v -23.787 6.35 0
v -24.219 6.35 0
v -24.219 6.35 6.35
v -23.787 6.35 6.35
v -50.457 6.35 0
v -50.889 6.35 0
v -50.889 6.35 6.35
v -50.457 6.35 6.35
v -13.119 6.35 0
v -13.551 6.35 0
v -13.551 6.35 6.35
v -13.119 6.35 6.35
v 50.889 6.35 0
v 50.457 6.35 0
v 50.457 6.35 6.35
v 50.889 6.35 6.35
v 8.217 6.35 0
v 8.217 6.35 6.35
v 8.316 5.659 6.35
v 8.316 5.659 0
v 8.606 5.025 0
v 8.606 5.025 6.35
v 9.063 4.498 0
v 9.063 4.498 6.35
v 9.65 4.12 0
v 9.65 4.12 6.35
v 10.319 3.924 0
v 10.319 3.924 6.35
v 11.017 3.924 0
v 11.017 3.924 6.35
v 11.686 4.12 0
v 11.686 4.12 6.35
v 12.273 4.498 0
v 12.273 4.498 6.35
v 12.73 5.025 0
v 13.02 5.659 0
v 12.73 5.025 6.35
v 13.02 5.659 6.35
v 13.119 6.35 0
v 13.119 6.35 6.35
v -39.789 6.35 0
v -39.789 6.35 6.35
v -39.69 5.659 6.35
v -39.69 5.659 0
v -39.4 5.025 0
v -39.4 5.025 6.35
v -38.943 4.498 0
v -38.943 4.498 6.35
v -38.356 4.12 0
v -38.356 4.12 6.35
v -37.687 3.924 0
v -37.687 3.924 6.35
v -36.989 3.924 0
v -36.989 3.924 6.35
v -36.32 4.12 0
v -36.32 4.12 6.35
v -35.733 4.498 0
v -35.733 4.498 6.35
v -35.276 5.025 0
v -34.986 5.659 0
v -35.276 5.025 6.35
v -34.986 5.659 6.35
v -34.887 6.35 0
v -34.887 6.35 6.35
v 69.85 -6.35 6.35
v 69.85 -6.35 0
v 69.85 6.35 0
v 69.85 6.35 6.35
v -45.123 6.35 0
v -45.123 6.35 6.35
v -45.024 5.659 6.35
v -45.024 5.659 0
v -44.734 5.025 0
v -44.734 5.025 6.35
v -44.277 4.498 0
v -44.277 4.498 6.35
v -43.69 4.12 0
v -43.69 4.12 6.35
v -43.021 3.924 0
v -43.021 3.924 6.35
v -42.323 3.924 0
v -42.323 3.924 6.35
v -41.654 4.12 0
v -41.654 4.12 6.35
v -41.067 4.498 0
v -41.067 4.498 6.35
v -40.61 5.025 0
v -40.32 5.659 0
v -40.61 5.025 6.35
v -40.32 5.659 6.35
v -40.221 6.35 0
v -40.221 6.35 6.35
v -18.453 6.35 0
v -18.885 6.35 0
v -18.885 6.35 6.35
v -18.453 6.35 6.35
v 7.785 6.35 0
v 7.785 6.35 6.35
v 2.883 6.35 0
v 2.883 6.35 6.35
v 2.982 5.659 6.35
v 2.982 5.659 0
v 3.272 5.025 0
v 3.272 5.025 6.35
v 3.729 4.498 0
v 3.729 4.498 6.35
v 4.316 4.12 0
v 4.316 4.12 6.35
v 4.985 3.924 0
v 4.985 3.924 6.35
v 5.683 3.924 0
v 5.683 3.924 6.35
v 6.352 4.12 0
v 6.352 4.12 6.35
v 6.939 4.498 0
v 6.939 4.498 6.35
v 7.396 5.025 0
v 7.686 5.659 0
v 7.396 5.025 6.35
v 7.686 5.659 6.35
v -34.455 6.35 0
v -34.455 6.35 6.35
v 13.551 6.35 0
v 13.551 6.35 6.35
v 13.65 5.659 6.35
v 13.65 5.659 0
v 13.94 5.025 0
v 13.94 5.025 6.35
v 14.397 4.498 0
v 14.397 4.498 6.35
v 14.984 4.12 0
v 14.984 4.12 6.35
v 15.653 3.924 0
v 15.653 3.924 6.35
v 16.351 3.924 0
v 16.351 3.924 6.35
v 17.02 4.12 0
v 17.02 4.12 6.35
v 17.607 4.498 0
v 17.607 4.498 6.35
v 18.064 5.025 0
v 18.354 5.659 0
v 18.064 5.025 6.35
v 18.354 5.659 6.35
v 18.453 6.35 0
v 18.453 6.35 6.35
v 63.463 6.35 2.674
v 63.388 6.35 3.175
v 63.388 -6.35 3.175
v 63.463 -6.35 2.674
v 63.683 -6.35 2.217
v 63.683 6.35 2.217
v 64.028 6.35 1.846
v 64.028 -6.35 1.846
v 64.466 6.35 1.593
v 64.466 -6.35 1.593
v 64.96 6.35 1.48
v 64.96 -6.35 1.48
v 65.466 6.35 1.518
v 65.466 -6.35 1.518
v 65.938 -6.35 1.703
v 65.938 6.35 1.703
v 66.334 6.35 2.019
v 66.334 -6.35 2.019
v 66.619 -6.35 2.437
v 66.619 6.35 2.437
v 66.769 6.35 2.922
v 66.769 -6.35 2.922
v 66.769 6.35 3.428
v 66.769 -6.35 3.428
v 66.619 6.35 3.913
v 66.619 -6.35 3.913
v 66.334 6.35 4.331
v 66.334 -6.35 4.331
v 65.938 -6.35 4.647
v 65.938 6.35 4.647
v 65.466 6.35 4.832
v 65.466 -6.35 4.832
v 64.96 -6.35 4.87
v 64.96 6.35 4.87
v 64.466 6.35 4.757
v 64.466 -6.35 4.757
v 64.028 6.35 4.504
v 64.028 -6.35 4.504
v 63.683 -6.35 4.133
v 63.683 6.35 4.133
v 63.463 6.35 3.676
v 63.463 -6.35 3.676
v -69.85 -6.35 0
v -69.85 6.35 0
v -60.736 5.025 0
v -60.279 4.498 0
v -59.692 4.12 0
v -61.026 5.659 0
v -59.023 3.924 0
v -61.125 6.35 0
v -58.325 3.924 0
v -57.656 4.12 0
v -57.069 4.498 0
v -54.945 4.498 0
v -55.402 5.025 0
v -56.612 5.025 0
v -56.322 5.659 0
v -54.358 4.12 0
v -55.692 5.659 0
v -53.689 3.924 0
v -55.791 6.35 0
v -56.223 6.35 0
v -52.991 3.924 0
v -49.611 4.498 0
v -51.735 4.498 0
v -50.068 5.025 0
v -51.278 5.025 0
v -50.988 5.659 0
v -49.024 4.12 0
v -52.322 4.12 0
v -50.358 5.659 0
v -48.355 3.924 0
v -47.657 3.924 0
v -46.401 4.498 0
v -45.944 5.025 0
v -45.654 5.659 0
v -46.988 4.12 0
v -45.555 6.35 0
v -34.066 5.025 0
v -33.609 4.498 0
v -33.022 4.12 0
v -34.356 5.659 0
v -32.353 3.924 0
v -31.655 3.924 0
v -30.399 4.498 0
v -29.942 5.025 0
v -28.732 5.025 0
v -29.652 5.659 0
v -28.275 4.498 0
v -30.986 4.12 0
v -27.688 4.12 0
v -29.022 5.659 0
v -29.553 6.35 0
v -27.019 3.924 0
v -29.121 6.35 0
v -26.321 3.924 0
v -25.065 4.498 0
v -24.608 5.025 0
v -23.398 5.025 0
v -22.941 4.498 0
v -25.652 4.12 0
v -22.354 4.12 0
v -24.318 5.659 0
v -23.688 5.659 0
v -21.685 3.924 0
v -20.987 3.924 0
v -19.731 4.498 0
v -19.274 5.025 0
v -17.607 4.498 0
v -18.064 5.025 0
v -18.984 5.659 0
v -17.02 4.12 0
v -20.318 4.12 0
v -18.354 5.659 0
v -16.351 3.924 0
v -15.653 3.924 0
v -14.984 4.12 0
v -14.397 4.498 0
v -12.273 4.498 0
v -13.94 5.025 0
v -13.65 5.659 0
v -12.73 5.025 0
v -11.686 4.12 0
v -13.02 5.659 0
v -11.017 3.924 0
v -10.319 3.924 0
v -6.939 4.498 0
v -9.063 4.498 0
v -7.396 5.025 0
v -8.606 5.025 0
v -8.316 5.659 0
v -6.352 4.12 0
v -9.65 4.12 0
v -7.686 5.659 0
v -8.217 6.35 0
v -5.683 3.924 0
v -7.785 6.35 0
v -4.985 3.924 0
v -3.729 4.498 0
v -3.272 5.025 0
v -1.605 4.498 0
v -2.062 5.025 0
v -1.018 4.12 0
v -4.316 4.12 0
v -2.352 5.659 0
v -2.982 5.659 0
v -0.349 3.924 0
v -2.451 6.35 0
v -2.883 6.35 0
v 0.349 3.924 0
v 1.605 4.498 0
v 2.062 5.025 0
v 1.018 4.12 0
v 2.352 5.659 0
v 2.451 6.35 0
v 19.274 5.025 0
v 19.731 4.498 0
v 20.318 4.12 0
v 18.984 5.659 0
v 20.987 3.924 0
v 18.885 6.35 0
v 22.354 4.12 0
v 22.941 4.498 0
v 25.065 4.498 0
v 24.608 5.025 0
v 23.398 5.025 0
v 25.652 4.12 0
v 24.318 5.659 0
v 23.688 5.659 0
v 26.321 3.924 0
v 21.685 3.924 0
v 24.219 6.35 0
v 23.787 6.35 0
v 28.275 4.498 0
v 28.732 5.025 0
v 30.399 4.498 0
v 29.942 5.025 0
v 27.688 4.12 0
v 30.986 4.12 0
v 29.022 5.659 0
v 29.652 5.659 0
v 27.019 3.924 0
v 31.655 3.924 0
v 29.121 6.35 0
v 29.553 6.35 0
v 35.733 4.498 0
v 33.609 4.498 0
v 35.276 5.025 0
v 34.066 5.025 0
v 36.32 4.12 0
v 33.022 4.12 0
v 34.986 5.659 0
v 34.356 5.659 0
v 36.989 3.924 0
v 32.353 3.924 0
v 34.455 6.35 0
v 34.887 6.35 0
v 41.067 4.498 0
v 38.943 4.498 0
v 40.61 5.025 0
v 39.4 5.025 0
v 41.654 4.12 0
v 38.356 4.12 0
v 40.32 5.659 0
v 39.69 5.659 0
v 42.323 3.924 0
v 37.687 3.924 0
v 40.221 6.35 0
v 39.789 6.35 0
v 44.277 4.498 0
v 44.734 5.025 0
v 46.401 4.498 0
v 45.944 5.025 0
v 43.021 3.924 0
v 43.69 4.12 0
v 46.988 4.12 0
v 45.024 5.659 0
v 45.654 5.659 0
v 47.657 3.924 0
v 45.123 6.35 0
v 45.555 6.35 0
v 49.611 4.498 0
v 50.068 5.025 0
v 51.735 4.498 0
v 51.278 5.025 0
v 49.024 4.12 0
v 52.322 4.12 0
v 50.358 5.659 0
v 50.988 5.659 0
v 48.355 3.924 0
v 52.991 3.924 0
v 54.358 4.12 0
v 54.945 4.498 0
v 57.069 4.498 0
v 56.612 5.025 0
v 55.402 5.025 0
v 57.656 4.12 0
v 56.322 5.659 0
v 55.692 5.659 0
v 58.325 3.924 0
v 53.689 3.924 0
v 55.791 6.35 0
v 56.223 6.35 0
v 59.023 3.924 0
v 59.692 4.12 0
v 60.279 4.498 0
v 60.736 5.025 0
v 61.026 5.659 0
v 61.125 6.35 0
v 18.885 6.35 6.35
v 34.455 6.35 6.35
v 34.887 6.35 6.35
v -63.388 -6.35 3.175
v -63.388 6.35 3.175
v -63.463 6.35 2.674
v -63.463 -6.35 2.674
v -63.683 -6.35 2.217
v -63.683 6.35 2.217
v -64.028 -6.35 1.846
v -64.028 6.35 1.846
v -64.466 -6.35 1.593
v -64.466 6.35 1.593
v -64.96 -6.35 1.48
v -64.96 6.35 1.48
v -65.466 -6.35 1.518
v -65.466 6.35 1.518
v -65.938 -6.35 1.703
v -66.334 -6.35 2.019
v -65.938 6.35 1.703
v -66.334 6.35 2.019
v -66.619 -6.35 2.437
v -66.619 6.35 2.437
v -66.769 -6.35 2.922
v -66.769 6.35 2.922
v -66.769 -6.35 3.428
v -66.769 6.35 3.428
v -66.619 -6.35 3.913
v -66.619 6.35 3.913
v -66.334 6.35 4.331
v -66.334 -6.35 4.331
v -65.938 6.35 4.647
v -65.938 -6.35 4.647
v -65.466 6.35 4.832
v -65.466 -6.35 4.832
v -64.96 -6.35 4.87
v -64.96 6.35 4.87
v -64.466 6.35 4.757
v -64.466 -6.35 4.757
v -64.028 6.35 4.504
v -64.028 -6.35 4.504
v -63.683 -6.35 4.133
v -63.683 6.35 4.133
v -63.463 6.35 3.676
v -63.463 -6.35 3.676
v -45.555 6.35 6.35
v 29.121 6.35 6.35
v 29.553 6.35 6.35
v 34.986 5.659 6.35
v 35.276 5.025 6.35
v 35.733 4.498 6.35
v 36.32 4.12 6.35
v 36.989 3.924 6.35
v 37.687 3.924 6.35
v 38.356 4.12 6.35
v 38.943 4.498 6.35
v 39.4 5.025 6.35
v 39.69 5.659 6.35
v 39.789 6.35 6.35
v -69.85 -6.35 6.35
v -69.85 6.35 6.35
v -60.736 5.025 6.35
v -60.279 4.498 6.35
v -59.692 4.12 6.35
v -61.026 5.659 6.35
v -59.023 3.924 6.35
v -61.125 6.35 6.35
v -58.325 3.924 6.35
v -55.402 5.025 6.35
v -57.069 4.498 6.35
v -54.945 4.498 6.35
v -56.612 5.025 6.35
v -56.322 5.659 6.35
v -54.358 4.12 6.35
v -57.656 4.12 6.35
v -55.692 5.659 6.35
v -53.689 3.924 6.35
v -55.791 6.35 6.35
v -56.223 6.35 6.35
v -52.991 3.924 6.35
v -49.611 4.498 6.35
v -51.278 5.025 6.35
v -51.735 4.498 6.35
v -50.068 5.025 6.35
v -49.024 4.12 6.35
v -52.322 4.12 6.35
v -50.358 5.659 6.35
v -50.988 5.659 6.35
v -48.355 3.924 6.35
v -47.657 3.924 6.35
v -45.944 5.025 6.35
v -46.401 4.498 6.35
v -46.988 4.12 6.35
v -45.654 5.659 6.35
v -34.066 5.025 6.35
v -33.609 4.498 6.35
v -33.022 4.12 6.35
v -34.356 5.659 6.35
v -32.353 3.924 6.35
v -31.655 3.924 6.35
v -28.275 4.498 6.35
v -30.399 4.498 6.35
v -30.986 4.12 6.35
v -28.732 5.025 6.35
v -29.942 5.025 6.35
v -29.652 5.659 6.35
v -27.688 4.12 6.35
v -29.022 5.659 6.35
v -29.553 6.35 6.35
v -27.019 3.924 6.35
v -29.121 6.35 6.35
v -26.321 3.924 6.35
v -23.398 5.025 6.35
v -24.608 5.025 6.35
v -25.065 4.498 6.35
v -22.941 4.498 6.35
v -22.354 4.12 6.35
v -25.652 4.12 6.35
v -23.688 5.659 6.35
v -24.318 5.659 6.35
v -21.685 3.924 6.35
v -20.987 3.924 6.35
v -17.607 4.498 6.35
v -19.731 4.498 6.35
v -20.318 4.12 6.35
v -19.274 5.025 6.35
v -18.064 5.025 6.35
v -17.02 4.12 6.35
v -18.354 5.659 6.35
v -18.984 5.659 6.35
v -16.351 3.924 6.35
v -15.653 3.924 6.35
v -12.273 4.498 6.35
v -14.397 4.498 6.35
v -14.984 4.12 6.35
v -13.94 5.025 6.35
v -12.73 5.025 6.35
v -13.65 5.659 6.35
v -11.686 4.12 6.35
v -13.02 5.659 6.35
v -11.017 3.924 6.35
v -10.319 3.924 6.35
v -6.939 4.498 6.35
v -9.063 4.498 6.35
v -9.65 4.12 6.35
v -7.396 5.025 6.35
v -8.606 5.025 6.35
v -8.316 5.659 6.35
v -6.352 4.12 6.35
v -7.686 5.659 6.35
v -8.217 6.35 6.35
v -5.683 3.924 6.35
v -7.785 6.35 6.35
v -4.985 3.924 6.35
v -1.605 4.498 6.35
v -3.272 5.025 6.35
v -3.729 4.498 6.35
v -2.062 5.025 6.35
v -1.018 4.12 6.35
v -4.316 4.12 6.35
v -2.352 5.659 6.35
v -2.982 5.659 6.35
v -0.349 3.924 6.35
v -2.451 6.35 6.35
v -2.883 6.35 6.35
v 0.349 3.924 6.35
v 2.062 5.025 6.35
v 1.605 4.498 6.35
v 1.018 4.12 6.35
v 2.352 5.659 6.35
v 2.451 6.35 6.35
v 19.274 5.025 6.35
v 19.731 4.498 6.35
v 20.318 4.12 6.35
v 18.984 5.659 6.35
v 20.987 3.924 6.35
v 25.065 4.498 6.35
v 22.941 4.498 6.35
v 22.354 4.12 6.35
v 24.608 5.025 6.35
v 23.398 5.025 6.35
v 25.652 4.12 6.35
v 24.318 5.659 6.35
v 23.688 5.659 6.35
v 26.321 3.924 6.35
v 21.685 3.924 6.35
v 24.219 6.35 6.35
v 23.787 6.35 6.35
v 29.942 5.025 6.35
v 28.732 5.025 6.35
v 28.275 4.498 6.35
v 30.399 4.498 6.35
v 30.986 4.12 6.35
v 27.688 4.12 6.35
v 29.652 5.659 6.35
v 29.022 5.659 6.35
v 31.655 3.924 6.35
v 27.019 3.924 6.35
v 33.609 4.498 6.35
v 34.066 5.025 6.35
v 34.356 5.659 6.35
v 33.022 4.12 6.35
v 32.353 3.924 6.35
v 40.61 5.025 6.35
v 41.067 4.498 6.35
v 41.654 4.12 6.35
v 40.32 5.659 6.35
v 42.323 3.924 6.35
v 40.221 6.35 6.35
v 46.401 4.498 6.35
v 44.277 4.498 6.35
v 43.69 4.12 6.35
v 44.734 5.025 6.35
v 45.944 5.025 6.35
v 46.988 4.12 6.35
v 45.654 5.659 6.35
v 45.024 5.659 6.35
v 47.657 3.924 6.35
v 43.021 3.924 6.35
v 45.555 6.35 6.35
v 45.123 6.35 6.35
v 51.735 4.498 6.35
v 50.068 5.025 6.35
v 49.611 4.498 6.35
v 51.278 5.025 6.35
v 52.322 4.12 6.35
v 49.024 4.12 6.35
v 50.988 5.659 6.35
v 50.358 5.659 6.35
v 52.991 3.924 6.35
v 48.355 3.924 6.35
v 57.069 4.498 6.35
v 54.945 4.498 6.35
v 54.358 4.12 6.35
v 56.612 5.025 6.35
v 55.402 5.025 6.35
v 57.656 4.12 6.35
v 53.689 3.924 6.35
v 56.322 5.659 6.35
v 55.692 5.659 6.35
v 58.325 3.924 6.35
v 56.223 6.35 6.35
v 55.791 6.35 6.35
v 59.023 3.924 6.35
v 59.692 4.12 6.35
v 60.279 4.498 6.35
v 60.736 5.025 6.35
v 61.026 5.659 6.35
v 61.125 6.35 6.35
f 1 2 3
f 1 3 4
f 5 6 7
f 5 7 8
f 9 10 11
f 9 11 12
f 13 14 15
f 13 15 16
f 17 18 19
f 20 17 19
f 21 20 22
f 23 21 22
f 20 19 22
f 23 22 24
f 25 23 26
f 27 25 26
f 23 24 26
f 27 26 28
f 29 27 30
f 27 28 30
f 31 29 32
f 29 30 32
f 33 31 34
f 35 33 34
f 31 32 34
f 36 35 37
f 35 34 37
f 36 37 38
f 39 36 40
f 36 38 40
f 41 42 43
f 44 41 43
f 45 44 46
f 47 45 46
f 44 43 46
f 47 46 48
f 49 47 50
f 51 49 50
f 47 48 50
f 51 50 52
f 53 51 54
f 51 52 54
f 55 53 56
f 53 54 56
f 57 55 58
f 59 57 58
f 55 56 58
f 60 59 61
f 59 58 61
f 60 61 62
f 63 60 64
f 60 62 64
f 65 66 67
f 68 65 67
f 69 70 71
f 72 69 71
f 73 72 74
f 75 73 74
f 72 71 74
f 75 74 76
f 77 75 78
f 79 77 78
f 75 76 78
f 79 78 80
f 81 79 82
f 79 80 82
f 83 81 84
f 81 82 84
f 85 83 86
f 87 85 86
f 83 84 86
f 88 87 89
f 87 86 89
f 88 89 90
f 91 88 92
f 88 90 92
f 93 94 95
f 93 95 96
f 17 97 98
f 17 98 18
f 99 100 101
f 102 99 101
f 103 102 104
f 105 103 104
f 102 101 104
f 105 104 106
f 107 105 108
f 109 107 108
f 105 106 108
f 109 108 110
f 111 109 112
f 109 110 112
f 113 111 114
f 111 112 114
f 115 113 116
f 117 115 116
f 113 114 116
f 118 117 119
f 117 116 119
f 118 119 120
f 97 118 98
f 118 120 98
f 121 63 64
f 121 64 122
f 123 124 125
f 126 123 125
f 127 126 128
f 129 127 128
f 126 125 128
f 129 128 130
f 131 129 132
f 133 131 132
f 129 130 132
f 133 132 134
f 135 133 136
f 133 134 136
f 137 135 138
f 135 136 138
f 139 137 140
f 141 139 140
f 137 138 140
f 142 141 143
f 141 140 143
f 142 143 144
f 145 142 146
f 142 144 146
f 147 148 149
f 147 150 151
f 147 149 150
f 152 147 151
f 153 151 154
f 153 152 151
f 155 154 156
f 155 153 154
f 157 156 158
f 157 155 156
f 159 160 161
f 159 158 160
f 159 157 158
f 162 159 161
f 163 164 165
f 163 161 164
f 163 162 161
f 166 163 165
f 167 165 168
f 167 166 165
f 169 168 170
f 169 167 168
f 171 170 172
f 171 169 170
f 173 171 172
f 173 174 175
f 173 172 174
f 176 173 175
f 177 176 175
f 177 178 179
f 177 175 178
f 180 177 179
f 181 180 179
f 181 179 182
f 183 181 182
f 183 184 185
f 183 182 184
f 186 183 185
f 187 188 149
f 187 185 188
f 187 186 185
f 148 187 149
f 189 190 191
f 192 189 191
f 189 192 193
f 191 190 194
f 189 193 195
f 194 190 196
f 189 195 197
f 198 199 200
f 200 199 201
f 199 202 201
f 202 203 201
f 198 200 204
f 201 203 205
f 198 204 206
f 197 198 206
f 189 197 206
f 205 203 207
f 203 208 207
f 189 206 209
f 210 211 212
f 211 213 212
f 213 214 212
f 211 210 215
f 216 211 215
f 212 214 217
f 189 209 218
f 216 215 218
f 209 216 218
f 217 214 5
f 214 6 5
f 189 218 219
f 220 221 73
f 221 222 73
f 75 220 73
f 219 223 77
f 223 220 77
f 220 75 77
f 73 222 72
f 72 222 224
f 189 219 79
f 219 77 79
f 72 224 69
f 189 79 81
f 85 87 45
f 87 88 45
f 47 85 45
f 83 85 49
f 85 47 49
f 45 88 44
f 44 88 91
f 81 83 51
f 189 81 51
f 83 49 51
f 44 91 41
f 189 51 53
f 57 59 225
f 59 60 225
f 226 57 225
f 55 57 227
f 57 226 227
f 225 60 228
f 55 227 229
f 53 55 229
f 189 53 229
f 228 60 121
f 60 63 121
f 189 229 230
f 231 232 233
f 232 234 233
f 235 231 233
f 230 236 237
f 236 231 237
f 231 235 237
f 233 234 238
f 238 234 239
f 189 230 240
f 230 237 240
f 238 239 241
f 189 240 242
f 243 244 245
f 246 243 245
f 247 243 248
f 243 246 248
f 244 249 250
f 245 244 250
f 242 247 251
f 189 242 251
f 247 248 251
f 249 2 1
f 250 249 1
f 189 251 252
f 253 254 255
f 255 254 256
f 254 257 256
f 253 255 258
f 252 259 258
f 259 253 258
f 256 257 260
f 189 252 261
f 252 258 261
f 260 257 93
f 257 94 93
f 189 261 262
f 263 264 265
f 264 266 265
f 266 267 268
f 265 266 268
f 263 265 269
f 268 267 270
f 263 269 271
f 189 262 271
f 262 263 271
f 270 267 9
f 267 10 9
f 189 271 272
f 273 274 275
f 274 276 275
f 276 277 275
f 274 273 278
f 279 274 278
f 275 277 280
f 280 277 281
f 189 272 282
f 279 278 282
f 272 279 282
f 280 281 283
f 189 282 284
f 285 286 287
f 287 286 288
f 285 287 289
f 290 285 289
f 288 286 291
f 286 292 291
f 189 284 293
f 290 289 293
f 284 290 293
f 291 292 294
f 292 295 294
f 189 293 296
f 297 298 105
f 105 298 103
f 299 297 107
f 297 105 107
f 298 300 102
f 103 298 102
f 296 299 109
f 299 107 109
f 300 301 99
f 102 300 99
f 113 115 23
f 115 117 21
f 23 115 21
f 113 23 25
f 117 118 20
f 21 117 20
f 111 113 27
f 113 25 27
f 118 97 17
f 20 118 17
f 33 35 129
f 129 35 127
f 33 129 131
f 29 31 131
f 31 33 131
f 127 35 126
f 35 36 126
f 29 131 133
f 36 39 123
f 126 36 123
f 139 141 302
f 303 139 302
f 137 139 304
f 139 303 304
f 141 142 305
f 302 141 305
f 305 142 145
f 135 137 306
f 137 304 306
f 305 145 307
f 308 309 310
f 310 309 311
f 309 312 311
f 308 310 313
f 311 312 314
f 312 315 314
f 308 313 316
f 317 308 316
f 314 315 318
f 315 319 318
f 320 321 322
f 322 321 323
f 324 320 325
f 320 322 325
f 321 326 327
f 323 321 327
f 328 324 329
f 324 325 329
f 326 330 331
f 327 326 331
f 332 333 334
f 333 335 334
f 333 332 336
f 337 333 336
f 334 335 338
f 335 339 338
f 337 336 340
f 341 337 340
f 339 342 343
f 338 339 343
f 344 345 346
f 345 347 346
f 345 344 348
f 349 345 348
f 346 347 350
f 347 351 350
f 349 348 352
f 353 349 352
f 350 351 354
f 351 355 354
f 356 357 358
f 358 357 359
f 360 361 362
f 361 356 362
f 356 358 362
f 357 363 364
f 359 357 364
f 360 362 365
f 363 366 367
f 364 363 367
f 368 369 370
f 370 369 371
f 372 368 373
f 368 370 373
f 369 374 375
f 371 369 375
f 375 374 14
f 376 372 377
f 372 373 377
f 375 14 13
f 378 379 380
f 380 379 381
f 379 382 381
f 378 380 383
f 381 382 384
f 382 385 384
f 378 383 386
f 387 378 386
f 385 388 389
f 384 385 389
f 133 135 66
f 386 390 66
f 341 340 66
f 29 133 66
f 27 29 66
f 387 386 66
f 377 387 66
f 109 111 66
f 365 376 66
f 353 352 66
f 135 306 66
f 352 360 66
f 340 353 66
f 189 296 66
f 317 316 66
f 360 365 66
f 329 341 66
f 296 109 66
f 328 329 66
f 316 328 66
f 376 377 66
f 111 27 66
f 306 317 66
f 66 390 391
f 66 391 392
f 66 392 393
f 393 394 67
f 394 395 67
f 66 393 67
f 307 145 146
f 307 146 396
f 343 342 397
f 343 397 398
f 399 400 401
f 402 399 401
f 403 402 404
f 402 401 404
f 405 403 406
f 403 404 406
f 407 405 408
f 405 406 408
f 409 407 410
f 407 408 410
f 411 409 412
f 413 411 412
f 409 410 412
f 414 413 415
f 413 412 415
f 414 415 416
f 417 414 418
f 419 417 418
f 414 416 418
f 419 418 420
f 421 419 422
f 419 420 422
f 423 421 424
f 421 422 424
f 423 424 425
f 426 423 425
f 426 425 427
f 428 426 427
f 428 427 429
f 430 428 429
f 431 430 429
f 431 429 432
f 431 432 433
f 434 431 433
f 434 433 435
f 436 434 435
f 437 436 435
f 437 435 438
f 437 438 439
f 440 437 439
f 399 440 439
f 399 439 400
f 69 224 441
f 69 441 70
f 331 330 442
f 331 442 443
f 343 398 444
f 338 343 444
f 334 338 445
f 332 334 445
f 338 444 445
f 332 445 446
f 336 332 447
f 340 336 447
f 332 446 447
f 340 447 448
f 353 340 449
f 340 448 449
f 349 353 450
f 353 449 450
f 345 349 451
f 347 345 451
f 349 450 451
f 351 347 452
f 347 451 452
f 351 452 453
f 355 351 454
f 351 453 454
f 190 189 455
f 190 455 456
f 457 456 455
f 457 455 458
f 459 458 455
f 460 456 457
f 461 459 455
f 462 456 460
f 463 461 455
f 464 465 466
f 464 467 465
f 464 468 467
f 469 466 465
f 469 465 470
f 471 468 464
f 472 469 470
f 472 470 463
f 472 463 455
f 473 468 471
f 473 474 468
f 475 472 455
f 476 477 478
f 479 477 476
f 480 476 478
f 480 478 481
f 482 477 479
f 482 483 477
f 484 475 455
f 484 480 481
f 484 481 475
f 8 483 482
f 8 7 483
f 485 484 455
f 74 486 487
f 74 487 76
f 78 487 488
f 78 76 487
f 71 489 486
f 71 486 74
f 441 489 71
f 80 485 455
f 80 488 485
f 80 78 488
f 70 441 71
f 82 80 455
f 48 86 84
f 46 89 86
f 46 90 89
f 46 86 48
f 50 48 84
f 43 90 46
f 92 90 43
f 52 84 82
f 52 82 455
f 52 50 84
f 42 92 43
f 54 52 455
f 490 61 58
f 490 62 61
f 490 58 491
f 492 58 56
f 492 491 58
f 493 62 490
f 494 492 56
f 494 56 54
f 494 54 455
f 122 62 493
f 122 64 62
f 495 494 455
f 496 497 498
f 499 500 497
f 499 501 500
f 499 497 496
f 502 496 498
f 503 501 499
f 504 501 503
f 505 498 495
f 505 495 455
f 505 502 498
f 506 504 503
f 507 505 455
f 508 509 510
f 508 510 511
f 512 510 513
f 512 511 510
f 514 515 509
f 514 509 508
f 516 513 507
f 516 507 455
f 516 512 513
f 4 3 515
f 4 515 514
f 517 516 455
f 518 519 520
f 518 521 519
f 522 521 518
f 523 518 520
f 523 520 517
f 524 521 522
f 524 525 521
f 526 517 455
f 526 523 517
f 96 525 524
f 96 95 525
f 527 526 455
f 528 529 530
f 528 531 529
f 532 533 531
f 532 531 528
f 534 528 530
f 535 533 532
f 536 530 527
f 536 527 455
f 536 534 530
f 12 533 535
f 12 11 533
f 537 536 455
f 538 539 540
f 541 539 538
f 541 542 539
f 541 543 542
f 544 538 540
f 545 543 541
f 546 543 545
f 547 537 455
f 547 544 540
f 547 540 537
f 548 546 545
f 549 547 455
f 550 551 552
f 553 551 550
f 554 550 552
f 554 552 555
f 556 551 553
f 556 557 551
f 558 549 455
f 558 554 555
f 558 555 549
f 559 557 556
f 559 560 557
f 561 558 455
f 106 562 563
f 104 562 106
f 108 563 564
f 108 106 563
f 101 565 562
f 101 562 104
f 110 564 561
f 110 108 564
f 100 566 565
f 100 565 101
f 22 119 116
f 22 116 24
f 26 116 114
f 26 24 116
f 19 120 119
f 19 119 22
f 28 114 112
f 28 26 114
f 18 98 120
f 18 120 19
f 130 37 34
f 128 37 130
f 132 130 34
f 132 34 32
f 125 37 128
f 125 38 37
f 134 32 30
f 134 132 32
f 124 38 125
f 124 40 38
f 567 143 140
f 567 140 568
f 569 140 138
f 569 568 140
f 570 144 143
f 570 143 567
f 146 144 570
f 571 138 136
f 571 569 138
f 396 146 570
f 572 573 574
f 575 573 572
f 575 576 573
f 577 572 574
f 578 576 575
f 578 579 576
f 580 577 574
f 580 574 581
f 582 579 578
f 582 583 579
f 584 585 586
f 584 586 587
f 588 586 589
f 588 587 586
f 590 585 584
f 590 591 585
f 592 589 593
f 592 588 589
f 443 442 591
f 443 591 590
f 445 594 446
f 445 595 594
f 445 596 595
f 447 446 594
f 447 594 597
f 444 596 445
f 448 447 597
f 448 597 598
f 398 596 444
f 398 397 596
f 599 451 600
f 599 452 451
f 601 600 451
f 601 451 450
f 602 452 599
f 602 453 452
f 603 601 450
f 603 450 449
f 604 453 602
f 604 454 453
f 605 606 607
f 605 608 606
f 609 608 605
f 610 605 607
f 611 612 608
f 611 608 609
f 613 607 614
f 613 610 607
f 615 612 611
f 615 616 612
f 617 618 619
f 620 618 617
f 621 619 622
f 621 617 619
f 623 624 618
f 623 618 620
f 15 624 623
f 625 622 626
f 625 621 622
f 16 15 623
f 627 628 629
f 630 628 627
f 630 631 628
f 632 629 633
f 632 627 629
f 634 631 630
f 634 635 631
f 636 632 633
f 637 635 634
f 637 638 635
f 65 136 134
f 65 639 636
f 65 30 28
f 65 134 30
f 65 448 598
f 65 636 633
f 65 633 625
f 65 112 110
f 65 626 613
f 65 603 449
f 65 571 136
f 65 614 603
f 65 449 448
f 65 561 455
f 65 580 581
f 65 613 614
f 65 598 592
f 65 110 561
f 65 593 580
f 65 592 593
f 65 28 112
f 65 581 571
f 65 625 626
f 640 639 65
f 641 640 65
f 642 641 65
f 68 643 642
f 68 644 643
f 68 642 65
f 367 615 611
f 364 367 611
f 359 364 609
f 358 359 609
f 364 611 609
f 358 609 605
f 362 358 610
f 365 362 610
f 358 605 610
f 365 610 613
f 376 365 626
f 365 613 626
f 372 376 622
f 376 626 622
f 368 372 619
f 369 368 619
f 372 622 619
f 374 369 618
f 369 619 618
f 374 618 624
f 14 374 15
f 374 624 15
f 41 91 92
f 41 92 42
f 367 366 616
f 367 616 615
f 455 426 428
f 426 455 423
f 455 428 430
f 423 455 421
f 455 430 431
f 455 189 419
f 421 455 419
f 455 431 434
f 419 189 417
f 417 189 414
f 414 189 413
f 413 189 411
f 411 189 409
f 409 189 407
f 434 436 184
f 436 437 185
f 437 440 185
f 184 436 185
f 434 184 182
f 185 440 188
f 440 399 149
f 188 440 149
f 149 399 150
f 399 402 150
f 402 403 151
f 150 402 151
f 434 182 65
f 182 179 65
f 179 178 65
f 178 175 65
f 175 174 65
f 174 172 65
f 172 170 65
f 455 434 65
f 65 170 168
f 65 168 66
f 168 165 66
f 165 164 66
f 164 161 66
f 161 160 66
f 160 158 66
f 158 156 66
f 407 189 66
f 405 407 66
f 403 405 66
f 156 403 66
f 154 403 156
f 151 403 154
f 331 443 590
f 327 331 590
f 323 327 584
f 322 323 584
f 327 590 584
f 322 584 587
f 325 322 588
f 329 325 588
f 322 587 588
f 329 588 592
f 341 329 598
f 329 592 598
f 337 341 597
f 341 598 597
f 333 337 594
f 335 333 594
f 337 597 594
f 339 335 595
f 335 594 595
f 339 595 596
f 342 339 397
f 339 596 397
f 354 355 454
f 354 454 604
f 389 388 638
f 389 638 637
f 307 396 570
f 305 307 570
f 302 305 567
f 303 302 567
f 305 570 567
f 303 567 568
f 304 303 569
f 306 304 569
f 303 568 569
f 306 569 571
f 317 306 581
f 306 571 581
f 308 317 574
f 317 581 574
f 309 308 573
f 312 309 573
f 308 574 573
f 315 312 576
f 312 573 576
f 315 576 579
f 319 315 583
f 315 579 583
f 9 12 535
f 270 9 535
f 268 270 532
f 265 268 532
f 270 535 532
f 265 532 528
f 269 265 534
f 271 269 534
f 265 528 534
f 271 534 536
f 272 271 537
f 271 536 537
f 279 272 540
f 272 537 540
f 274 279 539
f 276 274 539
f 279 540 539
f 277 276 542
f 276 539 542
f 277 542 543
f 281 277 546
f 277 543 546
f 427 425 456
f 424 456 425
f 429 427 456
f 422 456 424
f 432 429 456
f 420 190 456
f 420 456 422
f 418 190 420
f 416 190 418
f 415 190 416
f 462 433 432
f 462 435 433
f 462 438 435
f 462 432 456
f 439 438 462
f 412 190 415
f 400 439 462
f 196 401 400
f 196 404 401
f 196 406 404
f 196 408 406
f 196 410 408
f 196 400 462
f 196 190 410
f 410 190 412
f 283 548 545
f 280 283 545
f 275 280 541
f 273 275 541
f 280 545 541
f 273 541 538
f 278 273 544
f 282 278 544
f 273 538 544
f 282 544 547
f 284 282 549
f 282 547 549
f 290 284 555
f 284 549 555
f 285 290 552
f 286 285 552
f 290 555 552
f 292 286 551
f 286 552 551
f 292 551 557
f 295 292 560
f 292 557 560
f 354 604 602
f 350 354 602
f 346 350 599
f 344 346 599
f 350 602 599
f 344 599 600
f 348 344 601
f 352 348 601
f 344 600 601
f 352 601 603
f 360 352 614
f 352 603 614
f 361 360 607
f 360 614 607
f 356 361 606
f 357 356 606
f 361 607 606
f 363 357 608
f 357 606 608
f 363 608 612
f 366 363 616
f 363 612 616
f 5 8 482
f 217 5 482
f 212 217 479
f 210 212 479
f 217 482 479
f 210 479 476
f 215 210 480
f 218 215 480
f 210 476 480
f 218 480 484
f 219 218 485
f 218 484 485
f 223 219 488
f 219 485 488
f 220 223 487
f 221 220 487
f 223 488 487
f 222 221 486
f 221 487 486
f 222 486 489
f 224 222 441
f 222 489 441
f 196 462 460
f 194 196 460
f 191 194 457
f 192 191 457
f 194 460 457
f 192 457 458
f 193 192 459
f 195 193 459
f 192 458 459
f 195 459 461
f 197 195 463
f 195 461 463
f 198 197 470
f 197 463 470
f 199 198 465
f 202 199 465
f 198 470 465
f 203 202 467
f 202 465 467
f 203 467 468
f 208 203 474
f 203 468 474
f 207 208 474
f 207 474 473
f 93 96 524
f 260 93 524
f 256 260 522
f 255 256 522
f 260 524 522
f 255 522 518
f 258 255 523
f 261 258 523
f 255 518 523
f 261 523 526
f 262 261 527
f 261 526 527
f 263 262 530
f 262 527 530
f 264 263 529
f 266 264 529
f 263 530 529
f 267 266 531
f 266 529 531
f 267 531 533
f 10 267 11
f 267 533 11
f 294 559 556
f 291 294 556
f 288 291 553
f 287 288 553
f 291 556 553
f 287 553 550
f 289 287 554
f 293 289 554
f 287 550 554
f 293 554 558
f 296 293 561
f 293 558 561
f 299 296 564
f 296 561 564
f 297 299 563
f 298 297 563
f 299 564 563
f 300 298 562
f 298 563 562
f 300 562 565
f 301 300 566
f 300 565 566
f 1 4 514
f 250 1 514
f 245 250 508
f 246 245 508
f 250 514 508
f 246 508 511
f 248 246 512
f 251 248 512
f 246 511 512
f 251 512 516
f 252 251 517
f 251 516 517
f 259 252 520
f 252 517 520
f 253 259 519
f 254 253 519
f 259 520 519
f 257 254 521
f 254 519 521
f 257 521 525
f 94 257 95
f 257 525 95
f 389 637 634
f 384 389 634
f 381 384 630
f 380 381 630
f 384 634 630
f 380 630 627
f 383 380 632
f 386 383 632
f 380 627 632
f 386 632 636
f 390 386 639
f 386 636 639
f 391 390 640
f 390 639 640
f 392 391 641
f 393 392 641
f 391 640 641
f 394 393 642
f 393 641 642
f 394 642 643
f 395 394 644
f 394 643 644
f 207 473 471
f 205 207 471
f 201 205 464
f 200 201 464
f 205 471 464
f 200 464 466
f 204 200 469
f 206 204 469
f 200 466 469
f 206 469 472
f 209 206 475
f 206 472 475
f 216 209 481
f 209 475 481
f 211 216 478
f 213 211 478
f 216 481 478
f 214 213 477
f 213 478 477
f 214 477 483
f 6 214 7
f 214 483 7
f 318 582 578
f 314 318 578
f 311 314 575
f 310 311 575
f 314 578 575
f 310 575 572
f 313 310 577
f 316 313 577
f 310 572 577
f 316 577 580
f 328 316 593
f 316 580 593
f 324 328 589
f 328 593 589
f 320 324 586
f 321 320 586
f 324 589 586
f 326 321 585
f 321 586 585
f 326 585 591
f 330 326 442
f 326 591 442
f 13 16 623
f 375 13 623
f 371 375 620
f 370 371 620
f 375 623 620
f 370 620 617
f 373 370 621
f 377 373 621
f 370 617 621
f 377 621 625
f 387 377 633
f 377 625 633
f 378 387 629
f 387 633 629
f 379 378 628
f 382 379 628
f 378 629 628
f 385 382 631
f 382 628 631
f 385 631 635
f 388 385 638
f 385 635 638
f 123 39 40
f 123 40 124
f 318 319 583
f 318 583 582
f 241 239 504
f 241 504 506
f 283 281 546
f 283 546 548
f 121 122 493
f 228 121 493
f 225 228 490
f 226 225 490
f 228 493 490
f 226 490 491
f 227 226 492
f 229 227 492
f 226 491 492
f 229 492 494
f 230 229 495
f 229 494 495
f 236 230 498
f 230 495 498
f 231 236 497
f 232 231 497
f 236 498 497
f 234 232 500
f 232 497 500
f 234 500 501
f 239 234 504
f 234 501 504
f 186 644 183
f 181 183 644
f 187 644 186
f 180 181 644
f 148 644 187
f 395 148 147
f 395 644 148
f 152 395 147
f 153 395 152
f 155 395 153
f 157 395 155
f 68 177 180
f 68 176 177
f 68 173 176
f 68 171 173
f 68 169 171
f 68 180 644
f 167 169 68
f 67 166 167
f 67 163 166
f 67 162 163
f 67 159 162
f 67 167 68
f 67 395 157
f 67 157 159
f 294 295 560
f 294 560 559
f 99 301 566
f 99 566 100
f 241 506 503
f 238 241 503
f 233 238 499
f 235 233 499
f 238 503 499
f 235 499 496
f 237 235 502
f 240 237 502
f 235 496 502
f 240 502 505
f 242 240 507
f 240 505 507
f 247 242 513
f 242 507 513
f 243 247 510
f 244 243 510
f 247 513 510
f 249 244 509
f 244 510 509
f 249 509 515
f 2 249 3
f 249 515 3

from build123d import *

# Parameters (mm, degrees)
SKETCH1_W            = 139.7
SKETCH1_H            = 12.7
BOSS_EXTRUDE1_DEPTH  = 6.35
SKETCH2_R            = 2.4511
CUT_EXTRUDE1_DEPTH   = 7.35
M3_CLEARANCE_HOLE1_D = 3.4


with BuildPart() as part:
    # Sketch1 → Boss-Extrude1 (new body)
    with BuildSketch(Plane.XY):
        Rectangle(SKETCH1_W, SKETCH1_H)
    extrude(amount=BOSS_EXTRUDE1_DEPTH)

    # Sketch2 → Cut-Extrude1 (cut, through all)
    with BuildSketch(Plane.XY.offset(6.35)):
        with Locations((0, 6.35)):
            Circle(SKETCH2_R)
        with Locations((5.334, 6.35)):
            Circle(SKETCH2_R)
        with Locations((10.668, 6.35)):
            Circle(SKETCH2_R)
        with Locations((16.002, 6.35)):
            Circle(SKETCH2_R)
        with Locations((21.336, 6.35)):
            Circle(SKETCH2_R)
        with Locations((26.67, 6.35)):
            Circle(SKETCH2_R)
        with Locations((32.004, 6.35)):
            Circle(SKETCH2_R)
        with Locations((37.338, 6.35)):
            Circle(SKETCH2_R)
        with Locations((42.672, 6.35)):
            Circle(SKETCH2_R)
        with Locations((48.006, 6.35)):
            Circle(SKETCH2_R)
        with Locations((53.34, 6.35)):
            Circle(SKETCH2_R)
        with Locations((58.674, 6.35)):
            Circle(SKETCH2_R)
        with Locations((-5.334, 6.35)):
            Circle(SKETCH2_R)
        with Locations((-10.668, 6.35)):
            Circle(SKETCH2_R)
        with Locations((-16.002, 6.35)):
            Circle(SKETCH2_R)
        with Locations((-21.336, 6.35)):
            Circle(SKETCH2_R)
        with Locations((-26.67, 6.35)):
            Circle(SKETCH2_R)
        with Locations((-32.004, 6.35)):
            Circle(SKETCH2_R)
        with Locations((-37.338, 6.35)):
            Circle(SKETCH2_R)
        with Locations((-42.672, 6.35)):
            Circle(SKETCH2_R)
        with Locations((-48.006, 6.35)):
            Circle(SKETCH2_R)
        with Locations((-53.34, 6.35)):
            Circle(SKETCH2_R)
        with Locations((-58.674, 6.35)):
            Circle(SKETCH2_R)
    extrude(amount=-CUT_EXTRUDE1_DEPTH, mode=Mode.SUBTRACT)

    # M3 Clearance Hole1 (through all)
    with Locations(Plane(origin=(0, -6.35, 0), x_dir=(-1, 0, 0), z_dir=(0, -1, 0))):
        with Locations((65.0875, -3.175)):
            m3_clearance_hole1 = Hole(M3_CLEARANCE_HOLE1_D / 2)

    # Mirror1: M3 Clearance Hole1 across plane
    add(m3_clearance_hole1.mirror(Plane(origin=(0, 0, 0), x_dir=(0, 0, 1), z_dir=(1, 0, 0))), mode=Mode.SUBTRACT)


solid = part.part
